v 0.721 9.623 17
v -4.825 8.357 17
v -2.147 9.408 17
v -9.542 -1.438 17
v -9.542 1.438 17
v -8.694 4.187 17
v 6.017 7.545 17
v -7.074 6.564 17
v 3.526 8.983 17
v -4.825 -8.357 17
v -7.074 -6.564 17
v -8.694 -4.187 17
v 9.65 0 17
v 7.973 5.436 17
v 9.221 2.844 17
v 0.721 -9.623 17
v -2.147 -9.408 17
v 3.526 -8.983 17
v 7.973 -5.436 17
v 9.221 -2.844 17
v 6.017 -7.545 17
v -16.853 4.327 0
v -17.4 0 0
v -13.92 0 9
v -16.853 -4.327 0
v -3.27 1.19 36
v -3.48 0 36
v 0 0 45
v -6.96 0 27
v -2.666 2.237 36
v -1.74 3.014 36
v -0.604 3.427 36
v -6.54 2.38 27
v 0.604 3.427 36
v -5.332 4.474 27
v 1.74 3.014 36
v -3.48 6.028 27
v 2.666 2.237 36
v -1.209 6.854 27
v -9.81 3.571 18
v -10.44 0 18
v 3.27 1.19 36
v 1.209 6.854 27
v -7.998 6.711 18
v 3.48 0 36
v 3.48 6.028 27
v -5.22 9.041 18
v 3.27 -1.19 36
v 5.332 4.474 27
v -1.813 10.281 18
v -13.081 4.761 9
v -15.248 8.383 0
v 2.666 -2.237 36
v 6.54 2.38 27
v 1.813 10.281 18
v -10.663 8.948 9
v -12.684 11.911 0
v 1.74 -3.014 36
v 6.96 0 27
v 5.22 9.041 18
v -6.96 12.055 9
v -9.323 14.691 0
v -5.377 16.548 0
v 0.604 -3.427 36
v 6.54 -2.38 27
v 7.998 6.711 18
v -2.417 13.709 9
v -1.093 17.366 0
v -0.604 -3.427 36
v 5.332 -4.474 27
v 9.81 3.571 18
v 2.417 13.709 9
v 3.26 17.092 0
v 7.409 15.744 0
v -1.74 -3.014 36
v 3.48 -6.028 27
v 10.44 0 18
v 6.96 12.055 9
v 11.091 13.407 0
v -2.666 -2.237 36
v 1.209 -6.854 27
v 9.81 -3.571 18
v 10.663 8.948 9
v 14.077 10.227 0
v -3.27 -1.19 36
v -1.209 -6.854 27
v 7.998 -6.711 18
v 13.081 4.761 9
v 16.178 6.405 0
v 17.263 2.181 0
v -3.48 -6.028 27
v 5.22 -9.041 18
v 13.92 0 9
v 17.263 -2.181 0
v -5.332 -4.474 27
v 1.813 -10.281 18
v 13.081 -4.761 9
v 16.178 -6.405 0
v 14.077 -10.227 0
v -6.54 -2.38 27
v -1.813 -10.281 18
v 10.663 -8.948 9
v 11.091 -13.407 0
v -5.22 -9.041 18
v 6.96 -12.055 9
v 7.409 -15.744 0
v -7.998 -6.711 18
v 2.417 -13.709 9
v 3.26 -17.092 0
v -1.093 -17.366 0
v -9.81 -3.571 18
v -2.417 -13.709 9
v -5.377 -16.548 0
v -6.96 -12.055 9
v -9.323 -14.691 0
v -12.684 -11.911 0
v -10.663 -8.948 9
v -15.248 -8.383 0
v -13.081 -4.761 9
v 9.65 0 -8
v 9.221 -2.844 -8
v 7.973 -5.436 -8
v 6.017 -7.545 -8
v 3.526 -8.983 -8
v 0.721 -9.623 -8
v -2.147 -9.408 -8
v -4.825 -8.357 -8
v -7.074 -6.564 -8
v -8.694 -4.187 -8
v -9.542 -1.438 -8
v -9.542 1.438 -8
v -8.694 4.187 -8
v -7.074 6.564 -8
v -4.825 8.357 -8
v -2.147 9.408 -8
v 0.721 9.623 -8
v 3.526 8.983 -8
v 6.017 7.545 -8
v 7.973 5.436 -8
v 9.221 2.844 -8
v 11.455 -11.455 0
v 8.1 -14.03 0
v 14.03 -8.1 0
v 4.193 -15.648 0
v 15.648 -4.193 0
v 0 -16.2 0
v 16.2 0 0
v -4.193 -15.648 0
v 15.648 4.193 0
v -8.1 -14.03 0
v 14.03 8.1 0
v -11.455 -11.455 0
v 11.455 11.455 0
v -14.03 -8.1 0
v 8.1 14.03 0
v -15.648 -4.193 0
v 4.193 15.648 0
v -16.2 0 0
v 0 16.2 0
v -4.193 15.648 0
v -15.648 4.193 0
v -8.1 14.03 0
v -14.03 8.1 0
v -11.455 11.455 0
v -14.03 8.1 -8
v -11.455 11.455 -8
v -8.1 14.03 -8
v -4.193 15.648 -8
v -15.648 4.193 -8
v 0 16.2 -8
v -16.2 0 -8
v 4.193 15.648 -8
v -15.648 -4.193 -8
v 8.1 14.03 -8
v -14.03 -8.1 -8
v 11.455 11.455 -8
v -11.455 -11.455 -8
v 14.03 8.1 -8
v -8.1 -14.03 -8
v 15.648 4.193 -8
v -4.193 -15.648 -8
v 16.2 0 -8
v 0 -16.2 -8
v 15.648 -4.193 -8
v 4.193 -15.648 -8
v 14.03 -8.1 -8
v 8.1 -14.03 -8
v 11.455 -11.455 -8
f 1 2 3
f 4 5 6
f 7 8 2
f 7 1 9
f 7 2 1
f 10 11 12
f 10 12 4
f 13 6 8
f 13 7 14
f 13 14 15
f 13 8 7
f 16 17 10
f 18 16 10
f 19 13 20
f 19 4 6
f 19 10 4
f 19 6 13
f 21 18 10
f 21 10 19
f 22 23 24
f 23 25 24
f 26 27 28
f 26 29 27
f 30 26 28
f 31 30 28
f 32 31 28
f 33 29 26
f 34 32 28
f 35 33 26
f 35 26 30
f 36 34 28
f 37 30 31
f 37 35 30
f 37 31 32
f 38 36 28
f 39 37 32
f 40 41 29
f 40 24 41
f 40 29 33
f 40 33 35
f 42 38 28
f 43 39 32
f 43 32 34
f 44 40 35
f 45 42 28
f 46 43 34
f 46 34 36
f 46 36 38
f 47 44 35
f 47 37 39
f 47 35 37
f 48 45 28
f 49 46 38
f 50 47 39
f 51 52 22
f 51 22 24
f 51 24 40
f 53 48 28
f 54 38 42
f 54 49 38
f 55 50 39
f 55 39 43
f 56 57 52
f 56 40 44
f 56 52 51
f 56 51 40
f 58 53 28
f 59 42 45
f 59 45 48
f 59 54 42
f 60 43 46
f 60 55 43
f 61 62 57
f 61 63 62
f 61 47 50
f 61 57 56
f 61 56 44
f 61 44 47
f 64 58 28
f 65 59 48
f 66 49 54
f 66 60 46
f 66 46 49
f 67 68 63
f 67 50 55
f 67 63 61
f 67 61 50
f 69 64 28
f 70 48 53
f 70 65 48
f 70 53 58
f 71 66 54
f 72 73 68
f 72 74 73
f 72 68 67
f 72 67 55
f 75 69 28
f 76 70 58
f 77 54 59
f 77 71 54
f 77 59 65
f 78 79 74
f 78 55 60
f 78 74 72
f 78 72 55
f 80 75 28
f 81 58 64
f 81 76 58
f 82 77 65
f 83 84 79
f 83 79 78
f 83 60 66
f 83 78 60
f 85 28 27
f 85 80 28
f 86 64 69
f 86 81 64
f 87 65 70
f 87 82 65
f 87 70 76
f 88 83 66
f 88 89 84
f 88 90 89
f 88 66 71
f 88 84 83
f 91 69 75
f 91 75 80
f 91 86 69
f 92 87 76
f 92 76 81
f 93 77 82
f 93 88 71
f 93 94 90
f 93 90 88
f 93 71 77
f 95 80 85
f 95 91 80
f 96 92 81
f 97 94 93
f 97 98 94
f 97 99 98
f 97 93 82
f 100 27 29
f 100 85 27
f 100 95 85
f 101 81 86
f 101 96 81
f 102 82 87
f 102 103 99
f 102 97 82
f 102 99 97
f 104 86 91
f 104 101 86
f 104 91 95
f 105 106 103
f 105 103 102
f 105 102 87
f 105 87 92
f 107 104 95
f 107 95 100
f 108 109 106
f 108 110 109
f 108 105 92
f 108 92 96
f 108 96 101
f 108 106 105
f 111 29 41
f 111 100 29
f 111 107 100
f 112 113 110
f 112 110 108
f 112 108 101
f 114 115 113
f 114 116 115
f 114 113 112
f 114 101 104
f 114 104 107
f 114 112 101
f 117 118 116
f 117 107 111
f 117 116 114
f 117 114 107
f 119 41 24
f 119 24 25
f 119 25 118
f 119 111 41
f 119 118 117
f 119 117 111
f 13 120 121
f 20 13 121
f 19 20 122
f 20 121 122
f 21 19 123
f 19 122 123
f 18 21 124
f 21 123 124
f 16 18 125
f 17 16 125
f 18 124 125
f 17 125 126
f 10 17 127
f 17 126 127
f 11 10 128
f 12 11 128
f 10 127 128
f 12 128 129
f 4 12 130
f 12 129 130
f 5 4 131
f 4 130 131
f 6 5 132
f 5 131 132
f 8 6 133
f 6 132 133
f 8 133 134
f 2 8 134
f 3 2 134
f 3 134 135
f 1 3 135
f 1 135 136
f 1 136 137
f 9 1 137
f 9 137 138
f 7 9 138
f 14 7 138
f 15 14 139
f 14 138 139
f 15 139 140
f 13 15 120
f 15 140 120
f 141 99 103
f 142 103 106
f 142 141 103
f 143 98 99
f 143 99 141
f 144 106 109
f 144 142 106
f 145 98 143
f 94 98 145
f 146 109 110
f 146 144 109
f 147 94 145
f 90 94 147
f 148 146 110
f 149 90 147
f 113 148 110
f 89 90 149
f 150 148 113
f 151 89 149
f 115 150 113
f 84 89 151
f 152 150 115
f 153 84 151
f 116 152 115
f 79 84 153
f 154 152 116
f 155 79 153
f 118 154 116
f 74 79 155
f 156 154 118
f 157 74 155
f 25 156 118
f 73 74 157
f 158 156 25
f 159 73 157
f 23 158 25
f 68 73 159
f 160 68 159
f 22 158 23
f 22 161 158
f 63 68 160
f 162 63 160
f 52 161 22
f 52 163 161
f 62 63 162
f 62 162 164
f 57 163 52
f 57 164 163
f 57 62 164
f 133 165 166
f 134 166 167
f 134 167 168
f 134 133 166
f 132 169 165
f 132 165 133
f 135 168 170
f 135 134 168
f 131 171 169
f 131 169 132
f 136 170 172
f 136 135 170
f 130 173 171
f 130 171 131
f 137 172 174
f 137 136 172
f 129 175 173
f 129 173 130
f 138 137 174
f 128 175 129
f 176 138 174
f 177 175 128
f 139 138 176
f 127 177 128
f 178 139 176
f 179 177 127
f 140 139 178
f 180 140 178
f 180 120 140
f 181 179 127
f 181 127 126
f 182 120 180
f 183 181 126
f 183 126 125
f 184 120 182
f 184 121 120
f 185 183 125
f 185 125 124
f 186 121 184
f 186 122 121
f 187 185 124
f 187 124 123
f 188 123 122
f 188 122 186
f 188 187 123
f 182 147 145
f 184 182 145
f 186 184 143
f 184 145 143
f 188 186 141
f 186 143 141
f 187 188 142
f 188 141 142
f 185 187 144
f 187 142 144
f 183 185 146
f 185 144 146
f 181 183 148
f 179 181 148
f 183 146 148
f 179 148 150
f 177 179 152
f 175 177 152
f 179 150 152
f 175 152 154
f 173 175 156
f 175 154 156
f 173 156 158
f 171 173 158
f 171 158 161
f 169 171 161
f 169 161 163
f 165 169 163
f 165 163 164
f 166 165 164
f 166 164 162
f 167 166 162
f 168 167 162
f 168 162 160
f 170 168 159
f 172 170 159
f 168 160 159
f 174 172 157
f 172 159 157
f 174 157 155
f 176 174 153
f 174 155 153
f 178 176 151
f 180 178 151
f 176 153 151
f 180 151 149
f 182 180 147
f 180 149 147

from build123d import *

# Parameters (mm, degrees)
F2_R     = 16.2
F3_DEPTH = 8
F4_R     = 9.65
F5_DEPTH = 25


with BuildPart() as f1:
    # F0 (on Front) → F1 (revolve)
    with BuildSketch(Plane.XZ):
        Polygon((-17.4, 0), (0, 0), (0, 45), align=None)
    revolve(axis=Axis((0, 0, 22.5), (0, 0, -1)))

    # F2 (on face) → F3 (join)
    with BuildSketch(Plane(origin=(0, 0, 0), x_dir=(1, 0, 0), z_dir=(0, 0, -1))):
        Circle(F2_R)
    extrude(amount=F3_DEPTH)

    # F4 (on face) → F5 (cut)
    with BuildSketch(Plane(origin=(0, 0, -8), x_dir=(1, 0, 0), z_dir=(0, 0, -1))):
        Circle(F4_R)
    extrude(amount=-F5_DEPTH, mode=Mode.SUBTRACT)


solid = f1.part
